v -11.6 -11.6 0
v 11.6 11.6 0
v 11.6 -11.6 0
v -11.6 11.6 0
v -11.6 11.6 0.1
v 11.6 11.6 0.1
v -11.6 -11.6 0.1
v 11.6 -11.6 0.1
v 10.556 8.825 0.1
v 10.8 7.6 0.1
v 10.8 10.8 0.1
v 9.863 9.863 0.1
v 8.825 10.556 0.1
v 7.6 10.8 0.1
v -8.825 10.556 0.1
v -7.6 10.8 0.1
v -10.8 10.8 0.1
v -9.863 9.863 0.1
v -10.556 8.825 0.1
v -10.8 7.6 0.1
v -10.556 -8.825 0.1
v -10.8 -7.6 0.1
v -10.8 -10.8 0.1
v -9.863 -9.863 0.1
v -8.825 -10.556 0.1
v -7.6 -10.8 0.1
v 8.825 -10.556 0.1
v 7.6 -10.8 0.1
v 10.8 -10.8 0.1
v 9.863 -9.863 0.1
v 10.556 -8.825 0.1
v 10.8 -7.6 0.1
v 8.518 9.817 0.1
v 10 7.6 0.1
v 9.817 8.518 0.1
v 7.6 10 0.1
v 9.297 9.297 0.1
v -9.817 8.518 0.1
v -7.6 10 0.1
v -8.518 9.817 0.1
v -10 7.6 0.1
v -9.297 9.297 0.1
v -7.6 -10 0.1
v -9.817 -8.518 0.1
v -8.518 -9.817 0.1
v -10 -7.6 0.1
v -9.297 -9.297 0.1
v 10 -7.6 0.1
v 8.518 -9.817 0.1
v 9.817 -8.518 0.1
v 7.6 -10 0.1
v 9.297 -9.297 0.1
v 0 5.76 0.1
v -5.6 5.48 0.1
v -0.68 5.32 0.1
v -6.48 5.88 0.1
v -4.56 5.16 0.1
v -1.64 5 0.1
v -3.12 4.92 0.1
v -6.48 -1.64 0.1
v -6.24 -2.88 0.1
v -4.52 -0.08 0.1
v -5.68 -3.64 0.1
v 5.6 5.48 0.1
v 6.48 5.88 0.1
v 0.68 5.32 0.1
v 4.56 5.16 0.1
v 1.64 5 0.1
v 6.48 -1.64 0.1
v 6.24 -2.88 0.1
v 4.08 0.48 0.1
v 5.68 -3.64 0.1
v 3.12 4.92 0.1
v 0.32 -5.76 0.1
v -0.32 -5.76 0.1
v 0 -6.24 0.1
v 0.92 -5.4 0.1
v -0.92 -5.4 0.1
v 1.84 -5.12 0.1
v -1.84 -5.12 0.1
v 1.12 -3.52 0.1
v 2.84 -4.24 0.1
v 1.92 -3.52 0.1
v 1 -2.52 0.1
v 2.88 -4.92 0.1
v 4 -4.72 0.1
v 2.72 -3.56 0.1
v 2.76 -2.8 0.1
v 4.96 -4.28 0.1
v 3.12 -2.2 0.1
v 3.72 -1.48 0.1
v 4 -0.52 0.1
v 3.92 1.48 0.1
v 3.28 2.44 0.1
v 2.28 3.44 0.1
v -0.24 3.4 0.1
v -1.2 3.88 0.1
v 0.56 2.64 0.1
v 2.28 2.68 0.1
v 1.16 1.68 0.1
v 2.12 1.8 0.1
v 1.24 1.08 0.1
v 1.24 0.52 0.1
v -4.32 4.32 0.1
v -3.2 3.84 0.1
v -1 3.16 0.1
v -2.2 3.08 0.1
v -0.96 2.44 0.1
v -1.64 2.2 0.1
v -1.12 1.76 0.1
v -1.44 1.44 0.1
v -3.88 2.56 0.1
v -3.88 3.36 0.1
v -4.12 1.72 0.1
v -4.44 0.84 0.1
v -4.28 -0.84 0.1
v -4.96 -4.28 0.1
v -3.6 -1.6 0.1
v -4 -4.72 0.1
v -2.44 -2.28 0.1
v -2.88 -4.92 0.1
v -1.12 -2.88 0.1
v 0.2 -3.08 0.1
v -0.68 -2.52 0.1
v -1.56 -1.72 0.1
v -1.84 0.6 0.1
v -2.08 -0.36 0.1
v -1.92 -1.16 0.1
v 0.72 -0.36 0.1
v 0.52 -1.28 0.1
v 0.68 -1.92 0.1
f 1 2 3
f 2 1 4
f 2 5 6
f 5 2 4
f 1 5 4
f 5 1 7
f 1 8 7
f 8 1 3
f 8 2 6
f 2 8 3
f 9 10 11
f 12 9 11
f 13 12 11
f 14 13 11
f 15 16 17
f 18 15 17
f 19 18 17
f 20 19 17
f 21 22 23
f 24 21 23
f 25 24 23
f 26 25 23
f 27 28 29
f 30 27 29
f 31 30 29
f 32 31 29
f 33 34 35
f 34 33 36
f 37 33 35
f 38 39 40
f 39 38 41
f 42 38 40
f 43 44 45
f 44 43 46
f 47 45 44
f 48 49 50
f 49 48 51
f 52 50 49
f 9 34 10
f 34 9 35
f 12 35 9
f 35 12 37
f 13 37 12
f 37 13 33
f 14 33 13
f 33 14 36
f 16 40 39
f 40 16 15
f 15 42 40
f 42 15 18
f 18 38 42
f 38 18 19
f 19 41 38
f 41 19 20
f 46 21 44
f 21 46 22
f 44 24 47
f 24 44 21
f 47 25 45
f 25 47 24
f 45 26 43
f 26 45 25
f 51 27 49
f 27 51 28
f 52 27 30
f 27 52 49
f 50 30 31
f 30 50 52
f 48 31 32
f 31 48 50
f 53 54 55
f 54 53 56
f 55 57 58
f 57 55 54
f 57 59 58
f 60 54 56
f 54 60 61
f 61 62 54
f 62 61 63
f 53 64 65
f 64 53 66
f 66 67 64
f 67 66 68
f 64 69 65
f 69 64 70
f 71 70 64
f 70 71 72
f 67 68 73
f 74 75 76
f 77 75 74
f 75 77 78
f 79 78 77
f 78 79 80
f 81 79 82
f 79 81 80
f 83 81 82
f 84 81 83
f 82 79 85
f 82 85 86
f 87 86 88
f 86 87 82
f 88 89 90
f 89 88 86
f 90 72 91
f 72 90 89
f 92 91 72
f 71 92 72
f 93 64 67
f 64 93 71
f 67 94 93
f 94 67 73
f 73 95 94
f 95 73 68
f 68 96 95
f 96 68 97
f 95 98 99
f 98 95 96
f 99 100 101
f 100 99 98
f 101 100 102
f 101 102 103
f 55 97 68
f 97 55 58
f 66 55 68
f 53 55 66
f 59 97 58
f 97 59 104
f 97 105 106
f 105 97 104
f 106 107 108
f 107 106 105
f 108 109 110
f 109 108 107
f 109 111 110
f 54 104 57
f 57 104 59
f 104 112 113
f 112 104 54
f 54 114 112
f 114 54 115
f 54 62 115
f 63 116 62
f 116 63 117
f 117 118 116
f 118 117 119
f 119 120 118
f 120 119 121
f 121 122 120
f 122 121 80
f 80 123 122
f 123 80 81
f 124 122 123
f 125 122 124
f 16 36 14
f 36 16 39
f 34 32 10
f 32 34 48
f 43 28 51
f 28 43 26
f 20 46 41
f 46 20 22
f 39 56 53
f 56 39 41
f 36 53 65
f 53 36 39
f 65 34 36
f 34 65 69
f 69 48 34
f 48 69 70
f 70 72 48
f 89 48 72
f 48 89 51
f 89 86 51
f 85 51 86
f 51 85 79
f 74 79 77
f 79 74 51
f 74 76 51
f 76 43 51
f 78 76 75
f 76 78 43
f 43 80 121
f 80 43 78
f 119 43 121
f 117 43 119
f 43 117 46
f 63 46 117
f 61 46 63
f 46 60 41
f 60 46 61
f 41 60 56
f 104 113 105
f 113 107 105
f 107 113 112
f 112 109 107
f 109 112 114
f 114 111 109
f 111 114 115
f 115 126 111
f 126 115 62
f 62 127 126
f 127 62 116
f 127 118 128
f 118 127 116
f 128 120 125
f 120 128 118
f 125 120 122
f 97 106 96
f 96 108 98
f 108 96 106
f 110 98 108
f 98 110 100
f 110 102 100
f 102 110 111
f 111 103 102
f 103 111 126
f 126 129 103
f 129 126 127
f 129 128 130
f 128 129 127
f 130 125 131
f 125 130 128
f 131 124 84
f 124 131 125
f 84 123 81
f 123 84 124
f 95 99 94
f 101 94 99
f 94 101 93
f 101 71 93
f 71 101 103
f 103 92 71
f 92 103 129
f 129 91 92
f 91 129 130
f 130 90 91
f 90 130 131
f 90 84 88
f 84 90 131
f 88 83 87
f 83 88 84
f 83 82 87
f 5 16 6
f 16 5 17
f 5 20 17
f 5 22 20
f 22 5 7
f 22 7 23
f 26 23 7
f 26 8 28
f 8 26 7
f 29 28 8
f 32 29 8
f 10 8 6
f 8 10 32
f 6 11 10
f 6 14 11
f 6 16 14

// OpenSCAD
// file: ../p/box5-12.scad
use <../lib.scad>
function ldraw_lib__box5_12() = [
// 0 Box with 5 Faces without Any Edges
// 0 Name: box5-12.dat
// 0 Author: Chris Dee [cwdee]
// 0 !LDRAW_ORG Primitive UPDATE 2009-02
// 0 !LICENSE Licensed under CC BY 4.0 : see CAreadme.txt
// 
// 0 BFC CERTIFY CCW
  [0,"BFC","CERTIFY"],
  [0,"BFC","CCW"],
// 
// 0 !HISTORY 2009-09-03 [PTadmin] Official Update 2009-02
// 
// 
// 4 16 1 1 1 1 1 -1 -1 1 -1 -1 1 1
  [4,16,1,1,1,1,1,-1,-1,1,-1,-1,1,1],
// 4 16 -1 0 1 1 0 1 1 1 1 -1 1 1
  [4,16,-1,0,1,1,0,1,1,1,1,-1,1,1],
// 4 16 -1 0 -1 -1 0 1 -1 1 1 -1 1 -1
  [4,16,-1,0,-1,-1,0,1,-1,1,1,-1,1,-1],
// 4 16 1 0 -1 -1 0 -1 -1 1 -1 1 1 -1
  [4,16,1,0,-1,-1,0,-1,-1,1,-1,1,1,-1],
// 4 16 1 0 1 1 0 -1 1 1 -1 1 1 1
  [4,16,1,0,1,1,0,-1,1,1,-1,1,1,1],
// 0
];
module ldraw_lib__box5_12(step=0, col=false, unit=2/5, alt=false, line=0.2, solid=!$preview)
    makepoly(ldraw_lib__box5_12(), step=step, col=col, unit=unit, alt=alt, line=line, solid=solid);
ldraw_lib__box5_12(line=0.2);
// file: ../p/1-4ring3.scad
use <../lib.scad>
function ldraw_lib__1_4ring3() = [
// 0 Ring  3 x 0.25
// 0 Name: 1-4ring3.dat
// 0 Author: Willy Tschager [Holly-Wood]
// 0 !LDRAW_ORG Primitive UPDATE 2024-01
// 0 !LICENSE Licensed under CC BY 4.0 : see CAreadme.txt
// 
// 0 BFC CERTIFY CCW
  [0,"BFC","CERTIFY"],
  [0,"BFC","CCW"],
// 
// 0 !HISTORY 1999-07-05 [PTadmin] Official Update 1999-05
// 0 !HISTORY 2003-01-21 [cavehop] Update Added BFC and 1 digit of significance
// 0 !HISTORY 2003-05-21 [cavehop] Corrected values as indicated by pneaster
// 0 !HISTORY 2003-06-12 [cavehop] Re-corrected values as indicated by pneaster
// 0 !HISTORY 2003-08-01 [PTadmin] Official Update 2003-02
// 0 !HISTORY 2007-06-22 [PTadmin] Header formatted for Contributor Agreement
// 0 !HISTORY 2008-07-01 [PTadmin] Official Update 2008-01
// 0 !HISTORY 2012-02-16 [Philo] Changed to CCW
// 0 !HISTORY 2012-03-30 [PTadmin] Official Update 2012-01
// 0 !HISTORY 2024-01-04 [Holly-Wood] Complete re-write, original by Karim Nassar
// 0 !HISTORY 2024-01-29 [OrionP] Official Update 2024-01
// 
// 4 16 4 0 0 3.6956 0 1.5308 2.7717 0 1.1481 3 0 0
  [4,16,4,0,0,3.6956,0,1.5308,2.7717,0,1.1481,3,0,0],
// 4 16 3.6956 0 1.5308 2.8284 0 2.8284 2.1213 0 2.1213 2.7717 0 1.1481
  [4,16,3.6956,0,1.5308,2.8284,0,2.8284,2.1213,0,2.1213,2.7717,0,1.1481],
// 4 16 2.8284 0 2.8284 1.5308 0 3.6956 1.1481 0 2.7717 2.1213 0 2.1213
  [4,16,2.8284,0,2.8284,1.5308,0,3.6956,1.1481,0,2.7717,2.1213,0,2.1213],
// 4 16 1.5308 0 3.6956 0 0 4 0 0 3 1.1481 0 2.7717
  [4,16,1.5308,0,3.6956,0,0,4,0,0,3,1.1481,0,2.7717],
// 0 // Build by LDPartEditor (PrimGen 2.X)
];
module ldraw_lib__1_4ring3(step=0, col=false, unit=2/5, alt=false, line=0.2, solid=!$preview)
    makepoly(ldraw_lib__1_4ring3(), step=step, col=col, unit=unit, alt=alt, line=line, solid=solid);
ldraw_lib__1_4ring3(line=0.2);
// file: ../p/1-4ndis.scad
use <../lib.scad>
function ldraw_lib__1_4ndis() = [
// 0 Disc Negative 0.25
// 0 Name: 1-4ndis.dat
// 0 Author: James Jessiman
// 0 !LDRAW_ORG Primitive UPDATE 2012-01
// 0 !LICENSE Licensed under CC BY 4.0 : see CAreadme.txt
// 
// 0 BFC CERTIFY CCW
  [0,"BFC","CERTIFY"],
  [0,"BFC","CCW"],
// 
// 0 !HISTORY 2002-03-23 [sbliss] Added BFC Statement
// 0 !HISTORY 2002-04-25 [PTadmin] Official Update 2002-02
// 0 !HISTORY 2007-06-22 [PTadmin] Header formatted for Contributor Agreement
// 0 !HISTORY 2008-07-01 [PTadmin] Official Update 2008-01
// 0 !HISTORY 2012-02-16 [Philo] Changed to CCW
// 0 !HISTORY 2012-03-30 [PTadmin] Official Update 2012-01
// 
// 
// 3 16 0.9239 0 0.3827 1 0 0 1 0 1
  [3,16,0.9239,0,0.3827,1,0,0,1,0,1],
// 3 16 0.7071 0 0.7071 0.9239 0 0.3827 1 0 1
  [3,16,0.7071,0,0.7071,0.9239,0,0.3827,1,0,1],
// 3 16 0.3827 0 0.9239 0.7071 0 0.7071 1 0 1
  [3,16,0.3827,0,0.9239,0.7071,0,0.7071,1,0,1],
// 3 16 0 0 1 0.3827 0 0.9239 1 0 1
  [3,16,0,0,1,0.3827,0,0.9239,1,0,1],
];
module ldraw_lib__1_4ndis(step=0, col=false, unit=2/5, alt=false, line=0.2, solid=!$preview)
    makepoly(ldraw_lib__1_4ndis(), step=step, col=col, unit=unit, alt=alt, line=line, solid=solid);
ldraw_lib__1_4ndis(line=0.2);
// file: ../p/1-4chrd.scad
use <../lib.scad>
function ldraw_lib__1_4chrd() = [
// 0 Chord 0.25
// 0 Name: 1-4chrd.dat
// 0 Author: Max Martin Richter [MMR1988]
// 0 !LDRAW_ORG Primitive UPDATE 2023-05
// 0 !LICENSE Licensed under CC BY 4.0 : see CAreadme.txt
// 
// 0 BFC CERTIFY CCW
  [0,"BFC","CERTIFY"],
  [0,"BFC","CCW"],
// 
// 0 !HISTORY 2004-04-22 [PTadmin] Official Update 2004-02
// 0 !HISTORY 2007-10-09 [PTadmin] Header formatted for Contributor Agreement
// 0 !HISTORY 2008-07-01 [PTadmin] Official Update 2008-01
// 0 !HISTORY 2012-08-02 [MMR1988] Re-creation with PrimGen2 and Rectifier
// 0 !HISTORY 2012-08-09 [PTadmin] Official Update 2012-02
// 0 !HISTORY 2023-10-27 [OrionP] Change author to MMR1988 from hafhead
// 0 !HISTORY 2023-10-31 [OrionP] Official Update 2023-05
// 
// 4 16 0.9239 0 0.3827 0.3827 0 0.9239 0 0 1 1 0 0
  [4,16,0.9239,0,0.3827,0.3827,0,0.9239,0,0,1,1,0,0],
// 3 16 0.7071 0 0.7071 0.3827 0 0.9239 0.9239 0 0.3827
  [3,16,0.7071,0,0.7071,0.3827,0,0.9239,0.9239,0,0.3827],
];
module ldraw_lib__1_4chrd(step=0, col=false, unit=2/5, alt=false, line=0.2, solid=!$preview)
    makepoly(ldraw_lib__1_4chrd(), step=step, col=col, unit=unit, alt=alt, line=line, solid=solid);
ldraw_lib__1_4chrd(line=0.2);
// main file
use <../lib.scad>
use <../p/1-4chrd.scad>
use <../p/1-4ndis.scad>
use <../p/1-4ring3.scad>
use <../p/box5-12.scad>
function ldraw_lib__168135h() = [
// 0 Sticker  2.9 x  2.9 with Fire Logo Badge
// 0 Name: 168135h.dat
// 0 Author: Takeshi Takahashi [RainbowDolphin]
// 0 !LDRAW_ORG Part UPDATE 2026-05
// 0 !LICENSE Licensed under CC BY 4.0 : see CAreadme.txt
// 
// 0 BFC CERTIFY CCW
  [0,"BFC","CERTIFY"],
  [0,"BFC","CCW"],
// 
// 0 !KEYWORDS Bricklink 6571stk01, Brickowl 674556, Fire 1994, Fire Station
// 0 !KEYWORDS Flame fighters, Rebrickable 168135, Set 6571, stamp
// 
// 0 !HISTORY 2026-05-31 [OrionP] Official Update 2026-05
// 
// 1 16 0 -0.25 0 29 0 0 0 0.25 0 0 0 29 box5-12.dat
  [1,16,0,-0.25,0,29,0,0,0,0.25,0,0,0,29, ldraw_lib__box5_12()],
// 1 16 19 -0.25 19 8 0 0 0 1 0 0 0 8 1-4ndis.dat
  [1,16,19,-0.25,19,8,0,0,0,1,0,0,0,8, ldraw_lib__1_4ndis()],
// 1 16 -19 -0.25 19 0 0 -8 0 1 0 8 0 0 1-4ndis.dat
  [1,16,-19,-0.25,19,0,0,-8,0,1,0,8,0,0, ldraw_lib__1_4ndis()],
// 1 16 -19 -0.25 -19 -8 0 0 0 1 0 0 0 -8 1-4ndis.dat
  [1,16,-19,-0.25,-19,-8,0,0,0,1,0,0,0,-8, ldraw_lib__1_4ndis()],
// 1 16 19 -0.25 -19 0 0 8 0 1 0 -8 0 0 1-4ndis.dat
  [1,16,19,-0.25,-19,0,0,8,0,1,0,-8,0,0, ldraw_lib__1_4ndis()],
// 0 BFC NOCLIP
  [0,"BFC","NOCLIP"],
// 1 4 19 -0.25 19 6 0 0 0 1 0 0 0 6 1-4chrd.dat
  [1,4,19,-0.25,19,6,0,0,0,1,0,0,0,6, ldraw_lib__1_4chrd()],
// 1 4 -19 -0.25 19 0 0 -6 0 1 0 6 0 0 1-4chrd.dat
  [1,4,-19,-0.25,19,0,0,-6,0,1,0,6,0,0, ldraw_lib__1_4chrd()],
// 1 4 -19 -0.25 -19 -6 0 0 0 1 0 0 0 -6 1-4chrd.dat
  [1,4,-19,-0.25,-19,-6,0,0,0,1,0,0,0,-6, ldraw_lib__1_4chrd()],
// 1 4 19 -0.25 -19 0 0 6 0 1 0 -6 0 0 1-4chrd.dat
  [1,4,19,-0.25,-19,0,0,6,0,1,0,-6,0,0, ldraw_lib__1_4chrd()],
// 1 0 19 -0.25 19 2 0 0 0 1 0 0 0 2 1-4ring3.dat
  [1,0,19,-0.25,19,2,0,0,0,1,0,0,0,2, ldraw_lib__1_4ring3()],
// 1 0 -19 -0.25 19 0 0 -2 0 1 0 2 0 0 1-4ring3.dat
  [1,0,-19,-0.25,19,0,0,-2,0,1,0,2,0,0, ldraw_lib__1_4ring3()],
// 1 0 -19 -0.25 -19 -2 0 0 0 1 0 0 0 -2 1-4ring3.dat
  [1,0,-19,-0.25,-19,-2,0,0,0,1,0,0,0,-2, ldraw_lib__1_4ring3()],
// 1 0 19 -0.25 -19 0 0 2 0 1 0 -2 0 0 1-4ring3.dat
  [1,0,19,-0.25,-19,0,0,2,0,1,0,-2,0,0, ldraw_lib__1_4ring3()],
// 4 4 0 -0.25 14.4 -16.2 -0.25 14.7 -14 -0.25 13.7 -1.7 -0.25 13.3
  [4,4,0,-0.25,14.4,-16.2,-0.25,14.7,-14,-0.25,13.7,-1.7,-0.25,13.3],
// 4 4 -1.7 -0.25 13.3 -14 -0.25 13.7 -11.4 -0.25 12.9 -4.1 -0.25 12.5
  [4,4,-1.7,-0.25,13.3,-14,-0.25,13.7,-11.4,-0.25,12.9,-4.1,-0.25,12.5],
// 3 4 -11.4 -0.25 12.9 -7.8 -0.25 12.3 -4.1 -0.25 12.5
  [3,4,-11.4,-0.25,12.9,-7.8,-0.25,12.3,-4.1,-0.25,12.5],
// 4 0 -14 -0.25 13.7 -16.2 -0.25 14.7 -16.2 -0.25 -4.1 -15.6 -0.25 -7.2
  [4,0,-14,-0.25,13.7,-16.2,-0.25,14.7,-16.2,-0.25,-4.1,-15.6,-0.25,-7.2],
// 4 0 -14 -0.25 13.7 -15.6 -0.25 -7.2 -14.2 -0.25 -9.1 -11.3 -0.25 -0.2
  [4,0,-14,-0.25,13.7,-15.6,-0.25,-7.2,-14.2,-0.25,-9.1,-11.3,-0.25,-0.2],
// 4 4 14 -0.25 13.7 16.2 -0.25 14.7 0 -0.25 14.4 1.7 -0.25 13.3
  [4,4,14,-0.25,13.7,16.2,-0.25,14.7,0,-0.25,14.4,1.7,-0.25,13.3],
// 4 4 11.4 -0.25 12.9 14 -0.25 13.7 1.7 -0.25 13.3 4.1 -0.25 12.5
  [4,4,11.4,-0.25,12.9,14,-0.25,13.7,1.7,-0.25,13.3,4.1,-0.25,12.5],
// 4 0 16.2 -0.25 -4.1 16.2 -0.25 14.7 14 -0.25 13.7 15.6 -0.25 -7.2
  [4,0,16.2,-0.25,-4.1,16.2,-0.25,14.7,14,-0.25,13.7,15.6,-0.25,-7.2],
// 4 0 14.2 -0.25 -9.1 15.6 -0.25 -7.2 14 -0.25 13.7 10.2 -0.25 1.2
  [4,0,14.2,-0.25,-9.1,15.6,-0.25,-7.2,14,-0.25,13.7,10.2,-0.25,1.2],
// 3 4 11.4 -0.25 12.9 4.1 -0.25 12.5 7.8 -0.25 12.3
  [3,4,11.4,-0.25,12.9,4.1,-0.25,12.5,7.8,-0.25,12.3],
// 3 0 0.8 -0.25 -14.4 -0.8 -0.25 -14.4 0 -0.25 -15.6
  [3,0,0.8,-0.25,-14.4,-0.8,-0.25,-14.4,0,-0.25,-15.6],
// 4 0 -2.3 -0.25 -13.5 -0.8 -0.25 -14.4 0.8 -0.25 -14.4 2.3 -0.25 -13.5
  [4,0,-2.3,-0.25,-13.5,-0.8,-0.25,-14.4,0.8,-0.25,-14.4,2.3,-0.25,-13.5],
// 4 0 -4.6 -0.25 -12.8 -2.3 -0.25 -13.5 2.3 -0.25 -13.5 4.6 -0.25 -12.8
  [4,0,-4.6,-0.25,-12.8,-2.3,-0.25,-13.5,2.3,-0.25,-13.5,4.6,-0.25,-12.8],
// 4 0 2.8 -0.25 -8.8 -4.6 -0.25 -12.8 4.6 -0.25 -12.8 7.1 -0.25 -10.6
  [4,0,2.8,-0.25,-8.8,-4.6,-0.25,-12.8,4.6,-0.25,-12.8,7.1,-0.25,-10.6],
// 3 0 4.8 -0.25 -8.8 2.8 -0.25 -8.8 7.1 -0.25 -10.6
  [3,0,4.8,-0.25,-8.8,2.8,-0.25,-8.8,7.1,-0.25,-10.6],
// 3 0 2.5 -0.25 -6.3 2.8 -0.25 -8.8 4.8 -0.25 -8.8
  [3,0,2.5,-0.25,-6.3,2.8,-0.25,-8.8,4.8,-0.25,-8.8],
// 3 0 7.1 -0.25 -10.6 4.6 -0.25 -12.8 7.2 -0.25 -12.3
  [3,0,7.1,-0.25,-10.6,4.6,-0.25,-12.8,7.2,-0.25,-12.3],
// 3 0 7.1 -0.25 -10.6 7.2 -0.25 -12.3 10 -0.25 -11.8
  [3,0,7.1,-0.25,-10.6,7.2,-0.25,-12.3,10,-0.25,-11.8],
// 4 0 6.8 -0.25 -8.9 7.1 -0.25 -10.6 10 -0.25 -11.8 6.9 -0.25 -7
  [4,0,6.8,-0.25,-8.9,7.1,-0.25,-10.6,10,-0.25,-11.8,6.9,-0.25,-7],
// 4 0 6.9 -0.25 -7 10 -0.25 -11.8 12.4 -0.25 -10.7 7.8 -0.25 -5.5
  [4,0,6.9,-0.25,-7,10,-0.25,-11.8,12.4,-0.25,-10.7,7.8,-0.25,-5.5],
// 4 0 7.8 -0.25 -5.5 12.4 -0.25 -10.7 14.2 -0.25 -9.1 9.3 -0.25 -3.7
  [4,0,7.8,-0.25,-5.5,12.4,-0.25,-10.7,14.2,-0.25,-9.1,9.3,-0.25,-3.7],
// 3 0 10 -0.25 -1.3 9.3 -0.25 -3.7 14.2 -0.25 -9.1
  [3,0,10,-0.25,-1.3,9.3,-0.25,-3.7,14.2,-0.25,-9.1],
// 3 0 10.2 -0.25 1.2 10 -0.25 -1.3 14.2 -0.25 -9.1
  [3,0,10.2,-0.25,1.2,10,-0.25,-1.3,14.2,-0.25,-9.1],
// 4 0 9.8 -0.25 3.7 10.2 -0.25 1.2 14 -0.25 13.7 11.4 -0.25 12.9
  [4,0,9.8,-0.25,3.7,10.2,-0.25,1.2,14,-0.25,13.7,11.4,-0.25,12.9],
// 4 0 8.2 -0.25 6.1 9.8 -0.25 3.7 11.4 -0.25 12.9 7.8 -0.25 12.3
  [4,0,8.2,-0.25,6.1,9.8,-0.25,3.7,11.4,-0.25,12.9,7.8,-0.25,12.3],
// 4 0 5.7 -0.25 8.6 8.2 -0.25 6.1 7.8 -0.25 12.3 4.1 -0.25 12.5
  [4,0,5.7,-0.25,8.6,8.2,-0.25,6.1,7.8,-0.25,12.3,4.1,-0.25,12.5],
// 4 0 5.7 -0.25 8.6 4.1 -0.25 12.5 -3 -0.25 9.7 -0.6 -0.25 8.5
  [4,0,5.7,-0.25,8.6,4.1,-0.25,12.5,-3,-0.25,9.7,-0.6,-0.25,8.5],
// 4 0 5.7 -0.25 6.7 5.7 -0.25 8.6 -0.6 -0.25 8.5 1.4 -0.25 6.6
  [4,0,5.7,-0.25,6.7,5.7,-0.25,8.6,-0.6,-0.25,8.5,1.4,-0.25,6.6],
// 4 0 5.3 -0.25 4.5 5.7 -0.25 6.7 1.4 -0.25 6.6 2.9 -0.25 4.2
  [4,0,5.3,-0.25,4.5,5.7,-0.25,6.7,1.4,-0.25,6.6,2.9,-0.25,4.2],
// 3 0 5.3 -0.25 4.5 2.9 -0.25 4.2 3.1 -0.25 2.7
  [3,0,5.3,-0.25,4.5,2.9,-0.25,4.2,3.1,-0.25,2.7],
// 3 0 5.3 -0.25 4.5 3.1 -0.25 2.7 3.1 -0.25 1.3
  [3,0,5.3,-0.25,4.5,3.1,-0.25,2.7,3.1,-0.25,1.3],
// 4 0 -4.1 -0.25 12.5 -3 -0.25 9.7 4.1 -0.25 12.5 -1.7 -0.25 13.3
  [4,0,-4.1,-0.25,12.5,-3,-0.25,9.7,4.1,-0.25,12.5,-1.7,-0.25,13.3],
// 3 0 1.7 -0.25 13.3 -1.7 -0.25 13.3 4.1 -0.25 12.5
  [3,0,1.7,-0.25,13.3,-1.7,-0.25,13.3,4.1,-0.25,12.5],
// 3 0 0 -0.25 14.4 -1.7 -0.25 13.3 1.7 -0.25 13.3
  [3,0,0,-0.25,14.4,-1.7,-0.25,13.3,1.7,-0.25,13.3],
// 4 0 -3 -0.25 9.7 -4.1 -0.25 12.5 -7.8 -0.25 12.3 -10.8 -0.25 10.8
  [4,0,-3,-0.25,9.7,-4.1,-0.25,12.5,-7.8,-0.25,12.3,-10.8,-0.25,10.8],
// 4 0 -3 -0.25 9.7 -10.8 -0.25 10.8 -8 -0.25 9.6 -2.5 -0.25 7.9
  [4,0,-3,-0.25,9.7,-10.8,-0.25,10.8,-8,-0.25,9.6,-2.5,-0.25,7.9],
// 4 0 -2.5 -0.25 7.9 -8 -0.25 9.6 -5.5 -0.25 7.7 -2.4 -0.25 6.1
  [4,0,-2.5,-0.25,7.9,-8,-0.25,9.6,-5.5,-0.25,7.7,-2.4,-0.25,6.1],
// 4 0 -2.4 -0.25 6.1 -5.5 -0.25 7.7 -4.1 -0.25 5.5 -2.8 -0.25 4.4
  [4,0,-2.4,-0.25,6.1,-5.5,-0.25,7.7,-4.1,-0.25,5.5,-2.8,-0.25,4.4],
// 3 0 -4.1 -0.25 5.5 -3.6 -0.25 3.6 -2.8 -0.25 4.4
  [3,0,-4.1,-0.25,5.5,-3.6,-0.25,3.6,-2.8,-0.25,4.4],
// 3 0 -14 -0.25 13.7 -10.8 -0.25 10.8 -11.4 -0.25 12.9
  [3,0,-14,-0.25,13.7,-10.8,-0.25,10.8,-11.4,-0.25,12.9],
// 3 0 -11.4 -0.25 12.9 -10.8 -0.25 10.8 -7.8 -0.25 12.3
  [3,0,-11.4,-0.25,12.9,-10.8,-0.25,10.8,-7.8,-0.25,12.3],
// 4 0 -9.7 -0.25 8.4 -10.8 -0.25 10.8 -14 -0.25 13.7 -9.7 -0.25 6.4
  [4,0,-9.7,-0.25,8.4,-10.8,-0.25,10.8,-14,-0.25,13.7,-9.7,-0.25,6.4],
// 4 0 -10.3 -0.25 4.3 -9.7 -0.25 6.4 -14 -0.25 13.7 -11.1 -0.25 2.1
  [4,0,-10.3,-0.25,4.3,-9.7,-0.25,6.4,-14,-0.25,13.7,-11.1,-0.25,2.1],
// 3 0 -14 -0.25 13.7 -11.3 -0.25 -0.2 -11.1 -0.25 2.1
  [3,0,-14,-0.25,13.7,-11.3,-0.25,-0.2,-11.1,-0.25,2.1],
// 4 0 -10.7 -0.25 -2.1 -11.3 -0.25 -0.2 -14.2 -0.25 -9.1 -12.4 -0.25 -10.7
  [4,0,-10.7,-0.25,-2.1,-11.3,-0.25,-0.2,-14.2,-0.25,-9.1,-12.4,-0.25,-10.7],
// 4 0 -9 -0.25 -4 -10.7 -0.25 -2.1 -12.4 -0.25 -10.7 -10 -0.25 -11.8
  [4,0,-9,-0.25,-4,-10.7,-0.25,-2.1,-12.4,-0.25,-10.7,-10,-0.25,-11.8],
// 4 0 -6.1 -0.25 -5.7 -9 -0.25 -4 -10 -0.25 -11.8 -7.2 -0.25 -12.3
  [4,0,-6.1,-0.25,-5.7,-9,-0.25,-4,-10,-0.25,-11.8,-7.2,-0.25,-12.3],
// 4 0 -2.8 -0.25 -7.2 -6.1 -0.25 -5.7 -7.2 -0.25 -12.3 -4.6 -0.25 -12.8
  [4,0,-2.8,-0.25,-7.2,-6.1,-0.25,-5.7,-7.2,-0.25,-12.3,-4.6,-0.25,-12.8],
// 4 0 0.5 -0.25 -7.7 -2.8 -0.25 -7.2 -4.6 -0.25 -12.8 2.8 -0.25 -8.8
  [4,0,0.5,-0.25,-7.7,-2.8,-0.25,-7.2,-4.6,-0.25,-12.8,2.8,-0.25,-8.8],
// 3 0 -1.7 -0.25 -6.3 -2.8 -0.25 -7.2 0.5 -0.25 -7.7
  [3,0,-1.7,-0.25,-6.3,-2.8,-0.25,-7.2,0.5,-0.25,-7.7],
// 3 0 -3.9 -0.25 -4.3 -2.8 -0.25 -7.2 -1.7 -0.25 -6.3
  [3,0,-3.9,-0.25,-4.3,-2.8,-0.25,-7.2,-1.7,-0.25,-6.3],
// 4 0 19 -0.25 27 -19 -0.25 27 -19 -0.25 25 19 -0.25 25
  [4,0,19,-0.25,27,-19,-0.25,27,-19,-0.25,25,19,-0.25,25],
// 4 0 27 -0.25 19 25 -0.25 19 25 -0.25 -19 27 -0.25 -19
  [4,0,27,-0.25,19,25,-0.25,19,25,-0.25,-19,27,-0.25,-19],
// 4 0 19 -0.25 -25 -19 -0.25 -25 -19 -0.25 -27 19 -0.25 -27
  [4,0,19,-0.25,-25,-19,-0.25,-25,-19,-0.25,-27,19,-0.25,-27],
// 4 0 -25 -0.25 19 -27 -0.25 19 -27 -0.25 -19 -25 -0.25 -19
  [4,0,-25,-0.25,19,-27,-0.25,19,-27,-0.25,-19,-25,-0.25,-19],
// 4 4 -19 -0.25 25 -25 -0.25 19 -16.2 -0.25 14.7 0 -0.25 14.4
  [4,4,-19,-0.25,25,-25,-0.25,19,-16.2,-0.25,14.7,0,-0.25,14.4],
// 4 4 19 -0.25 25 -19 -0.25 25 0 -0.25 14.4 16.2 -0.25 14.7
  [4,4,19,-0.25,25,-19,-0.25,25,0,-0.25,14.4,16.2,-0.25,14.7],
// 4 4 25 -0.25 19 19 -0.25 25 16.2 -0.25 14.7 16.2 -0.25 -4.1
  [4,4,25,-0.25,19,19,-0.25,25,16.2,-0.25,14.7,16.2,-0.25,-4.1],
// 4 4 25 -0.25 -19 25 -0.25 19 16.2 -0.25 -4.1 15.6 -0.25 -7.2
  [4,4,25,-0.25,-19,25,-0.25,19,16.2,-0.25,-4.1,15.6,-0.25,-7.2],
// 3 4 15.6 -0.25 -7.2 14.2 -0.25 -9.1 25 -0.25 -19
  [3,4,15.6,-0.25,-7.2,14.2,-0.25,-9.1,25,-0.25,-19],
// 4 4 25 -0.25 -19 14.2 -0.25 -9.1 12.4 -0.25 -10.7 19 -0.25 -25
  [4,4,25,-0.25,-19,14.2,-0.25,-9.1,12.4,-0.25,-10.7,19,-0.25,-25],
// 3 4 12.4 -0.25 -10.7 10 -0.25 -11.8 19 -0.25 -25
  [3,4,12.4,-0.25,-10.7,10,-0.25,-11.8,19,-0.25,-25],
// 4 4 19 -0.25 -25 10 -0.25 -11.8 7.2 -0.25 -12.3 4.6 -0.25 -12.8
  [4,4,19,-0.25,-25,10,-0.25,-11.8,7.2,-0.25,-12.3,4.6,-0.25,-12.8],
// 4 4 19 -0.25 -25 4.6 -0.25 -12.8 2.3 -0.25 -13.5 0.8 -0.25 -14.4
  [4,4,19,-0.25,-25,4.6,-0.25,-12.8,2.3,-0.25,-13.5,0.8,-0.25,-14.4],
// 3 4 0.8 -0.25 -14.4 0 -0.25 -15.6 19 -0.25 -25
  [3,4,0.8,-0.25,-14.4,0,-0.25,-15.6,19,-0.25,-25],
// 3 4 0 -0.25 -15.6 -19 -0.25 -25 19 -0.25 -25
  [3,4,0,-0.25,-15.6,-19,-0.25,-25,19,-0.25,-25],
// 4 4 -19 -0.25 -25 0 -0.25 -15.6 -0.8 -0.25 -14.4 -2.3 -0.25 -13.5
  [4,4,-19,-0.25,-25,0,-0.25,-15.6,-0.8,-0.25,-14.4,-2.3,-0.25,-13.5],
// 4 4 -19 -0.25 -25 -2.3 -0.25 -13.5 -4.6 -0.25 -12.8 -7.2 -0.25 -12.3
  [4,4,-19,-0.25,-25,-2.3,-0.25,-13.5,-4.6,-0.25,-12.8,-7.2,-0.25,-12.3],
// 3 4 -10 -0.25 -11.8 -19 -0.25 -25 -7.2 -0.25 -12.3
  [3,4,-10,-0.25,-11.8,-19,-0.25,-25,-7.2,-0.25,-12.3],
// 4 4 -19 -0.25 -25 -10 -0.25 -11.8 -12.4 -0.25 -10.7 -25 -0.25 -19
  [4,4,-19,-0.25,-25,-10,-0.25,-11.8,-12.4,-0.25,-10.7,-25,-0.25,-19],
// 3 4 -14.2 -0.25 -9.1 -25 -0.25 -19 -12.4 -0.25 -10.7
  [3,4,-14.2,-0.25,-9.1,-25,-0.25,-19,-12.4,-0.25,-10.7],
// 3 4 -15.6 -0.25 -7.2 -25 -0.25 -19 -14.2 -0.25 -9.1
  [3,4,-15.6,-0.25,-7.2,-25,-0.25,-19,-14.2,-0.25,-9.1],
// 4 4 -25 -0.25 -19 -15.6 -0.25 -7.2 -16.2 -0.25 -4.1 -25 -0.25 19
  [4,4,-25,-0.25,-19,-15.6,-0.25,-7.2,-16.2,-0.25,-4.1,-25,-0.25,19],
// 3 4 -25 -0.25 19 -16.2 -0.25 -4.1 -16.2 -0.25 14.7
  [3,4,-25,-0.25,19,-16.2,-0.25,-4.1,-16.2,-0.25,14.7],
// 3 4 -10.8 -0.25 10.8 -9.7 -0.25 8.4 -8 -0.25 9.6
  [3,4,-10.8,-0.25,10.8,-9.7,-0.25,8.4,-8,-0.25,9.6],
// 4 4 -8 -0.25 9.6 -9.7 -0.25 8.4 -9.7 -0.25 6.4 -5.5 -0.25 7.7
  [4,4,-8,-0.25,9.6,-9.7,-0.25,8.4,-9.7,-0.25,6.4,-5.5,-0.25,7.7],
// 4 4 -5.5 -0.25 7.7 -9.7 -0.25 6.4 -10.3 -0.25 4.3 -4.1 -0.25 5.5
  [4,4,-5.5,-0.25,7.7,-9.7,-0.25,6.4,-10.3,-0.25,4.3,-4.1,-0.25,5.5],
// 4 4 -4.1 -0.25 5.5 -10.3 -0.25 4.3 -11.1 -0.25 2.1 -3.6 -0.25 3.6
  [4,4,-4.1,-0.25,5.5,-10.3,-0.25,4.3,-11.1,-0.25,2.1,-3.6,-0.25,3.6],
// 4 4 -4.6 -0.25 1.5 -3.6 -0.25 3.6 -11.1 -0.25 2.1 -11.3 -0.25 -0.2
  [4,4,-4.6,-0.25,1.5,-3.6,-0.25,3.6,-11.1,-0.25,2.1,-11.3,-0.25,-0.2],
// 4 4 -5.2 -0.25 -0.9 -4.6 -0.25 1.5 -11.3 -0.25 -0.2 -10.7 -0.25 -2.1
  [4,4,-5.2,-0.25,-0.9,-4.6,-0.25,1.5,-11.3,-0.25,-0.2,-10.7,-0.25,-2.1],
// 4 4 -4.8 -0.25 -2.9 -5.2 -0.25 -0.9 -10.7 -0.25 -2.1 -9 -0.25 -4
  [4,4,-4.8,-0.25,-2.9,-5.2,-0.25,-0.9,-10.7,-0.25,-2.1,-9,-0.25,-4],
// 4 4 -3.9 -0.25 -4.3 -4.8 -0.25 -2.9 -9 -0.25 -4 -6.1 -0.25 -5.7
  [4,4,-3.9,-0.25,-4.3,-4.8,-0.25,-2.9,-9,-0.25,-4,-6.1,-0.25,-5.7],
// 3 4 -3.9 -0.25 -4.3 -6.1 -0.25 -5.7 -2.8 -0.25 -7.2
  [3,4,-3.9,-0.25,-4.3,-6.1,-0.25,-5.7,-2.8,-0.25,-7.2],
// 3 25 -3 -0.25 9.7 -2.5 -0.25 7.9 -0.6 -0.25 8.5
  [3,25,-3,-0.25,9.7,-2.5,-0.25,7.9,-0.6,-0.25,8.5],
// 4 25 -0.6 -0.25 8.5 -2.5 -0.25 7.9 -2.4 -0.25 6.1 1.4 -0.25 6.6
  [4,25,-0.6,-0.25,8.5,-2.5,-0.25,7.9,-2.4,-0.25,6.1,1.4,-0.25,6.6],
// 4 25 1.4 -0.25 6.6 -2.4 -0.25 6.1 -2.8 -0.25 4.4 2.9 -0.25 4.2
  [4,25,1.4,-0.25,6.6,-2.4,-0.25,6.1,-2.8,-0.25,4.4,2.9,-0.25,4.2],
// 4 25 2.9 -0.25 4.2 -2.8 -0.25 4.4 -3.6 -0.25 3.6 3.1 -0.25 2.7
  [4,25,2.9,-0.25,4.2,-2.8,-0.25,4.4,-3.6,-0.25,3.6,3.1,-0.25,2.7],
// 4 25 3.1 -0.25 2.7 -3.6 -0.25 3.6 -4.6 -0.25 1.5 3.1 -0.25 1.3
  [4,25,3.1,-0.25,2.7,-3.6,-0.25,3.6,-4.6,-0.25,1.5,3.1,-0.25,1.3],
// 4 25 3.1 -0.25 1.3 -4.6 -0.25 1.5 -5.2 -0.25 -0.9 1.8 -0.25 -0.9
  [4,25,3.1,-0.25,1.3,-4.6,-0.25,1.5,-5.2,-0.25,-0.9,1.8,-0.25,-0.9],
// 4 25 1.8 -0.25 -0.9 -5.2 -0.25 -0.9 -4.8 -0.25 -2.9 1.3 -0.25 -3.2
  [4,25,1.8,-0.25,-0.9,-5.2,-0.25,-0.9,-4.8,-0.25,-2.9,1.3,-0.25,-3.2],
// 4 25 1.3 -0.25 -3.2 -4.8 -0.25 -2.9 -3.9 -0.25 -4.3 1.7 -0.25 -4.8
  [4,25,1.3,-0.25,-3.2,-4.8,-0.25,-2.9,-3.9,-0.25,-4.3,1.7,-0.25,-4.8],
// 4 25 1.7 -0.25 -4.8 -3.9 -0.25 -4.3 -1.7 -0.25 -6.3 2.5 -0.25 -6.3
  [4,25,1.7,-0.25,-4.8,-3.9,-0.25,-4.3,-1.7,-0.25,-6.3,2.5,-0.25,-6.3],
// 4 25 2.5 -0.25 -6.3 -1.7 -0.25 -6.3 0.5 -0.25 -7.7 2.8 -0.25 -8.8
  [4,25,2.5,-0.25,-6.3,-1.7,-0.25,-6.3,0.5,-0.25,-7.7,2.8,-0.25,-8.8],
// 3 14 5.7 -0.25 8.6 5.7 -0.25 6.7 8.2 -0.25 6.1
  [3,14,5.7,-0.25,8.6,5.7,-0.25,6.7,8.2,-0.25,6.1],
// 4 14 8.2 -0.25 6.1 5.7 -0.25 6.7 5.3 -0.25 4.5 9.8 -0.25 3.7
  [4,14,8.2,-0.25,6.1,5.7,-0.25,6.7,5.3,-0.25,4.5,9.8,-0.25,3.7],
// 4 14 9.8 -0.25 3.7 5.3 -0.25 4.5 3.1 -0.25 1.3 10.2 -0.25 1.2
  [4,14,9.8,-0.25,3.7,5.3,-0.25,4.5,3.1,-0.25,1.3,10.2,-0.25,1.2],
// 4 14 10.2 -0.25 1.2 3.1 -0.25 1.3 1.8 -0.25 -0.9 10 -0.25 -1.3
  [4,14,10.2,-0.25,1.2,3.1,-0.25,1.3,1.8,-0.25,-0.9,10,-0.25,-1.3],
// 4 14 10 -0.25 -1.3 1.8 -0.25 -0.9 1.3 -0.25 -3.2 9.3 -0.25 -3.7
  [4,14,10,-0.25,-1.3,1.8,-0.25,-0.9,1.3,-0.25,-3.2,9.3,-0.25,-3.7],
// 4 14 9.3 -0.25 -3.7 1.3 -0.25 -3.2 1.7 -0.25 -4.8 7.8 -0.25 -5.5
  [4,14,9.3,-0.25,-3.7,1.3,-0.25,-3.2,1.7,-0.25,-4.8,7.8,-0.25,-5.5],
// 4 14 7.8 -0.25 -5.5 1.7 -0.25 -4.8 2.5 -0.25 -6.3 6.9 -0.25 -7
  [4,14,7.8,-0.25,-5.5,1.7,-0.25,-4.8,2.5,-0.25,-6.3,6.9,-0.25,-7],
// 4 14 6.9 -0.25 -7 2.5 -0.25 -6.3 4.8 -0.25 -8.8 6.8 -0.25 -8.9
  [4,14,6.9,-0.25,-7,2.5,-0.25,-6.3,4.8,-0.25,-8.8,6.8,-0.25,-8.9],
// 3 14 4.8 -0.25 -8.8 7.1 -0.25 -10.6 6.8 -0.25 -8.9
  [3,14,4.8,-0.25,-8.8,7.1,-0.25,-10.6,6.8,-0.25,-8.9],
// 0 BFC CLIP
  [0,"BFC","CLIP"],
// 4 16 -19 -0.25 27 29 -0.25 29 -29 -0.25 29 -27 -0.25 27
  [4,16,-19,-0.25,27,29,-0.25,29,-29,-0.25,29,-27,-0.25,27],
// 3 16 -29 -0.25 29 -27 -0.25 19 -27 -0.25 27
  [3,16,-29,-0.25,29,-27,-0.25,19,-27,-0.25,27],
// 4 16 -27 -0.25 -19 -27 -0.25 19 -29 -0.25 29 -29 -0.25 -29
  [4,16,-27,-0.25,-19,-27,-0.25,19,-29,-0.25,29,-29,-0.25,-29],
// 3 16 -27 -0.25 -19 -29 -0.25 -29 -27 -0.25 -27
  [3,16,-27,-0.25,-19,-29,-0.25,-29,-27,-0.25,-27],
// 3 16 -19 -0.25 -27 -27 -0.25 -27 -29 -0.25 -29
  [3,16,-19,-0.25,-27,-27,-0.25,-27,-29,-0.25,-29],
// 4 16 19 -0.25 -27 -19 -0.25 -27 -29 -0.25 -29 29 -0.25 -29
  [4,16,19,-0.25,-27,-19,-0.25,-27,-29,-0.25,-29,29,-0.25,-29],
// 3 16 27 -0.25 -27 19 -0.25 -27 29 -0.25 -29
  [3,16,27,-0.25,-27,19,-0.25,-27,29,-0.25,-29],
// 3 16 27 -0.25 -19 27 -0.25 -27 29 -0.25 -29
  [3,16,27,-0.25,-19,27,-0.25,-27,29,-0.25,-29],
// 4 16 27 -0.25 19 27 -0.25 -19 29 -0.25 -29 29 -0.25 29
  [4,16,27,-0.25,19,27,-0.25,-19,29,-0.25,-29,29,-0.25,29],
// 3 16 29 -0.25 29 27 -0.25 27 27 -0.25 19
  [3,16,29,-0.25,29,27,-0.25,27,27,-0.25,19],
// 3 16 29 -0.25 29 19 -0.25 27 27 -0.25 27
  [3,16,29,-0.25,29,19,-0.25,27,27,-0.25,27],
// 3 16 29 -0.25 29 -19 -0.25 27 19 -0.25 27
  [3,16,29,-0.25,29,-19,-0.25,27,19,-0.25,27],
];
module ldraw_lib__168135h(step=0, col=false, unit=2/5, alt=false, line=0.2, solid=!$preview)
    makepoly(ldraw_lib__168135h(), step=step, col=col, unit=unit, alt=alt, line=line, solid=solid);
ldraw_lib__168135h(line=0.2);
